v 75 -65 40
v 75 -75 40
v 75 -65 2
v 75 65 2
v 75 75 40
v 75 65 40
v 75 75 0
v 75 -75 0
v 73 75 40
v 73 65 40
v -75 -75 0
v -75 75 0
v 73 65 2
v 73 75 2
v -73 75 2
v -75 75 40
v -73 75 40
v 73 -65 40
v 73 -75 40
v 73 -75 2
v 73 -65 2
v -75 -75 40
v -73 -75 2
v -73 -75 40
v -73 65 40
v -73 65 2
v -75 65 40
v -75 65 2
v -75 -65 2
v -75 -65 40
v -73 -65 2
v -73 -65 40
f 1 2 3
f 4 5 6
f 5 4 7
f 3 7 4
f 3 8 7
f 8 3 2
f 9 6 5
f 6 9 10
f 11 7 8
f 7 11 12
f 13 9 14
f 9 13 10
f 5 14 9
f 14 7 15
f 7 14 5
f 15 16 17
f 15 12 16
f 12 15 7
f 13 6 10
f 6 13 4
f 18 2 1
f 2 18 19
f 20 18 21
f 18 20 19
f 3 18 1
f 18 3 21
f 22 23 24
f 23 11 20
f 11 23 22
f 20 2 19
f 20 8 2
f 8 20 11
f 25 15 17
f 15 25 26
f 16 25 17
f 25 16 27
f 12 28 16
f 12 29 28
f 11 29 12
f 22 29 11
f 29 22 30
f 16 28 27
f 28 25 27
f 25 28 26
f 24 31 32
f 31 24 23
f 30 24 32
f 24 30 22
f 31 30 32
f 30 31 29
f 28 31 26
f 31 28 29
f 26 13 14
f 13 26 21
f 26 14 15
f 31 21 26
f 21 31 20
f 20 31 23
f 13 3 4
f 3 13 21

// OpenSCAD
hoot = 40;
width = 150;
depth = 150;
breadth = 10;
thin = 2;

plate(width, depth, thin);
clogs(width, depth, hoot, thin, breadth);


module plate(width, depth, height)
{
    translate([0, 0, height/2]){
        cube([width, depth, height], true);
    }
}

module clogs(width, depth, height, thin, breadth)
{
    translate([(width-thin)/2, (depth-breadth)/2, height/2])
    {
        cube([thin, breadth, height], true);
    }
    translate([(width-thin)/2, -(depth-breadth)/2, height/2])
    {
        cube([thin, breadth, height], true);
    }
    translate([-(width-thin)/2, (depth-breadth)/2, height/2])
    {
        cube([thin, breadth, height], true);
    }
    translate([-(width-thin)/2, -(depth-breadth)/2, height/2])
    {
        cube([thin, breadth, height], true);
    }
}
